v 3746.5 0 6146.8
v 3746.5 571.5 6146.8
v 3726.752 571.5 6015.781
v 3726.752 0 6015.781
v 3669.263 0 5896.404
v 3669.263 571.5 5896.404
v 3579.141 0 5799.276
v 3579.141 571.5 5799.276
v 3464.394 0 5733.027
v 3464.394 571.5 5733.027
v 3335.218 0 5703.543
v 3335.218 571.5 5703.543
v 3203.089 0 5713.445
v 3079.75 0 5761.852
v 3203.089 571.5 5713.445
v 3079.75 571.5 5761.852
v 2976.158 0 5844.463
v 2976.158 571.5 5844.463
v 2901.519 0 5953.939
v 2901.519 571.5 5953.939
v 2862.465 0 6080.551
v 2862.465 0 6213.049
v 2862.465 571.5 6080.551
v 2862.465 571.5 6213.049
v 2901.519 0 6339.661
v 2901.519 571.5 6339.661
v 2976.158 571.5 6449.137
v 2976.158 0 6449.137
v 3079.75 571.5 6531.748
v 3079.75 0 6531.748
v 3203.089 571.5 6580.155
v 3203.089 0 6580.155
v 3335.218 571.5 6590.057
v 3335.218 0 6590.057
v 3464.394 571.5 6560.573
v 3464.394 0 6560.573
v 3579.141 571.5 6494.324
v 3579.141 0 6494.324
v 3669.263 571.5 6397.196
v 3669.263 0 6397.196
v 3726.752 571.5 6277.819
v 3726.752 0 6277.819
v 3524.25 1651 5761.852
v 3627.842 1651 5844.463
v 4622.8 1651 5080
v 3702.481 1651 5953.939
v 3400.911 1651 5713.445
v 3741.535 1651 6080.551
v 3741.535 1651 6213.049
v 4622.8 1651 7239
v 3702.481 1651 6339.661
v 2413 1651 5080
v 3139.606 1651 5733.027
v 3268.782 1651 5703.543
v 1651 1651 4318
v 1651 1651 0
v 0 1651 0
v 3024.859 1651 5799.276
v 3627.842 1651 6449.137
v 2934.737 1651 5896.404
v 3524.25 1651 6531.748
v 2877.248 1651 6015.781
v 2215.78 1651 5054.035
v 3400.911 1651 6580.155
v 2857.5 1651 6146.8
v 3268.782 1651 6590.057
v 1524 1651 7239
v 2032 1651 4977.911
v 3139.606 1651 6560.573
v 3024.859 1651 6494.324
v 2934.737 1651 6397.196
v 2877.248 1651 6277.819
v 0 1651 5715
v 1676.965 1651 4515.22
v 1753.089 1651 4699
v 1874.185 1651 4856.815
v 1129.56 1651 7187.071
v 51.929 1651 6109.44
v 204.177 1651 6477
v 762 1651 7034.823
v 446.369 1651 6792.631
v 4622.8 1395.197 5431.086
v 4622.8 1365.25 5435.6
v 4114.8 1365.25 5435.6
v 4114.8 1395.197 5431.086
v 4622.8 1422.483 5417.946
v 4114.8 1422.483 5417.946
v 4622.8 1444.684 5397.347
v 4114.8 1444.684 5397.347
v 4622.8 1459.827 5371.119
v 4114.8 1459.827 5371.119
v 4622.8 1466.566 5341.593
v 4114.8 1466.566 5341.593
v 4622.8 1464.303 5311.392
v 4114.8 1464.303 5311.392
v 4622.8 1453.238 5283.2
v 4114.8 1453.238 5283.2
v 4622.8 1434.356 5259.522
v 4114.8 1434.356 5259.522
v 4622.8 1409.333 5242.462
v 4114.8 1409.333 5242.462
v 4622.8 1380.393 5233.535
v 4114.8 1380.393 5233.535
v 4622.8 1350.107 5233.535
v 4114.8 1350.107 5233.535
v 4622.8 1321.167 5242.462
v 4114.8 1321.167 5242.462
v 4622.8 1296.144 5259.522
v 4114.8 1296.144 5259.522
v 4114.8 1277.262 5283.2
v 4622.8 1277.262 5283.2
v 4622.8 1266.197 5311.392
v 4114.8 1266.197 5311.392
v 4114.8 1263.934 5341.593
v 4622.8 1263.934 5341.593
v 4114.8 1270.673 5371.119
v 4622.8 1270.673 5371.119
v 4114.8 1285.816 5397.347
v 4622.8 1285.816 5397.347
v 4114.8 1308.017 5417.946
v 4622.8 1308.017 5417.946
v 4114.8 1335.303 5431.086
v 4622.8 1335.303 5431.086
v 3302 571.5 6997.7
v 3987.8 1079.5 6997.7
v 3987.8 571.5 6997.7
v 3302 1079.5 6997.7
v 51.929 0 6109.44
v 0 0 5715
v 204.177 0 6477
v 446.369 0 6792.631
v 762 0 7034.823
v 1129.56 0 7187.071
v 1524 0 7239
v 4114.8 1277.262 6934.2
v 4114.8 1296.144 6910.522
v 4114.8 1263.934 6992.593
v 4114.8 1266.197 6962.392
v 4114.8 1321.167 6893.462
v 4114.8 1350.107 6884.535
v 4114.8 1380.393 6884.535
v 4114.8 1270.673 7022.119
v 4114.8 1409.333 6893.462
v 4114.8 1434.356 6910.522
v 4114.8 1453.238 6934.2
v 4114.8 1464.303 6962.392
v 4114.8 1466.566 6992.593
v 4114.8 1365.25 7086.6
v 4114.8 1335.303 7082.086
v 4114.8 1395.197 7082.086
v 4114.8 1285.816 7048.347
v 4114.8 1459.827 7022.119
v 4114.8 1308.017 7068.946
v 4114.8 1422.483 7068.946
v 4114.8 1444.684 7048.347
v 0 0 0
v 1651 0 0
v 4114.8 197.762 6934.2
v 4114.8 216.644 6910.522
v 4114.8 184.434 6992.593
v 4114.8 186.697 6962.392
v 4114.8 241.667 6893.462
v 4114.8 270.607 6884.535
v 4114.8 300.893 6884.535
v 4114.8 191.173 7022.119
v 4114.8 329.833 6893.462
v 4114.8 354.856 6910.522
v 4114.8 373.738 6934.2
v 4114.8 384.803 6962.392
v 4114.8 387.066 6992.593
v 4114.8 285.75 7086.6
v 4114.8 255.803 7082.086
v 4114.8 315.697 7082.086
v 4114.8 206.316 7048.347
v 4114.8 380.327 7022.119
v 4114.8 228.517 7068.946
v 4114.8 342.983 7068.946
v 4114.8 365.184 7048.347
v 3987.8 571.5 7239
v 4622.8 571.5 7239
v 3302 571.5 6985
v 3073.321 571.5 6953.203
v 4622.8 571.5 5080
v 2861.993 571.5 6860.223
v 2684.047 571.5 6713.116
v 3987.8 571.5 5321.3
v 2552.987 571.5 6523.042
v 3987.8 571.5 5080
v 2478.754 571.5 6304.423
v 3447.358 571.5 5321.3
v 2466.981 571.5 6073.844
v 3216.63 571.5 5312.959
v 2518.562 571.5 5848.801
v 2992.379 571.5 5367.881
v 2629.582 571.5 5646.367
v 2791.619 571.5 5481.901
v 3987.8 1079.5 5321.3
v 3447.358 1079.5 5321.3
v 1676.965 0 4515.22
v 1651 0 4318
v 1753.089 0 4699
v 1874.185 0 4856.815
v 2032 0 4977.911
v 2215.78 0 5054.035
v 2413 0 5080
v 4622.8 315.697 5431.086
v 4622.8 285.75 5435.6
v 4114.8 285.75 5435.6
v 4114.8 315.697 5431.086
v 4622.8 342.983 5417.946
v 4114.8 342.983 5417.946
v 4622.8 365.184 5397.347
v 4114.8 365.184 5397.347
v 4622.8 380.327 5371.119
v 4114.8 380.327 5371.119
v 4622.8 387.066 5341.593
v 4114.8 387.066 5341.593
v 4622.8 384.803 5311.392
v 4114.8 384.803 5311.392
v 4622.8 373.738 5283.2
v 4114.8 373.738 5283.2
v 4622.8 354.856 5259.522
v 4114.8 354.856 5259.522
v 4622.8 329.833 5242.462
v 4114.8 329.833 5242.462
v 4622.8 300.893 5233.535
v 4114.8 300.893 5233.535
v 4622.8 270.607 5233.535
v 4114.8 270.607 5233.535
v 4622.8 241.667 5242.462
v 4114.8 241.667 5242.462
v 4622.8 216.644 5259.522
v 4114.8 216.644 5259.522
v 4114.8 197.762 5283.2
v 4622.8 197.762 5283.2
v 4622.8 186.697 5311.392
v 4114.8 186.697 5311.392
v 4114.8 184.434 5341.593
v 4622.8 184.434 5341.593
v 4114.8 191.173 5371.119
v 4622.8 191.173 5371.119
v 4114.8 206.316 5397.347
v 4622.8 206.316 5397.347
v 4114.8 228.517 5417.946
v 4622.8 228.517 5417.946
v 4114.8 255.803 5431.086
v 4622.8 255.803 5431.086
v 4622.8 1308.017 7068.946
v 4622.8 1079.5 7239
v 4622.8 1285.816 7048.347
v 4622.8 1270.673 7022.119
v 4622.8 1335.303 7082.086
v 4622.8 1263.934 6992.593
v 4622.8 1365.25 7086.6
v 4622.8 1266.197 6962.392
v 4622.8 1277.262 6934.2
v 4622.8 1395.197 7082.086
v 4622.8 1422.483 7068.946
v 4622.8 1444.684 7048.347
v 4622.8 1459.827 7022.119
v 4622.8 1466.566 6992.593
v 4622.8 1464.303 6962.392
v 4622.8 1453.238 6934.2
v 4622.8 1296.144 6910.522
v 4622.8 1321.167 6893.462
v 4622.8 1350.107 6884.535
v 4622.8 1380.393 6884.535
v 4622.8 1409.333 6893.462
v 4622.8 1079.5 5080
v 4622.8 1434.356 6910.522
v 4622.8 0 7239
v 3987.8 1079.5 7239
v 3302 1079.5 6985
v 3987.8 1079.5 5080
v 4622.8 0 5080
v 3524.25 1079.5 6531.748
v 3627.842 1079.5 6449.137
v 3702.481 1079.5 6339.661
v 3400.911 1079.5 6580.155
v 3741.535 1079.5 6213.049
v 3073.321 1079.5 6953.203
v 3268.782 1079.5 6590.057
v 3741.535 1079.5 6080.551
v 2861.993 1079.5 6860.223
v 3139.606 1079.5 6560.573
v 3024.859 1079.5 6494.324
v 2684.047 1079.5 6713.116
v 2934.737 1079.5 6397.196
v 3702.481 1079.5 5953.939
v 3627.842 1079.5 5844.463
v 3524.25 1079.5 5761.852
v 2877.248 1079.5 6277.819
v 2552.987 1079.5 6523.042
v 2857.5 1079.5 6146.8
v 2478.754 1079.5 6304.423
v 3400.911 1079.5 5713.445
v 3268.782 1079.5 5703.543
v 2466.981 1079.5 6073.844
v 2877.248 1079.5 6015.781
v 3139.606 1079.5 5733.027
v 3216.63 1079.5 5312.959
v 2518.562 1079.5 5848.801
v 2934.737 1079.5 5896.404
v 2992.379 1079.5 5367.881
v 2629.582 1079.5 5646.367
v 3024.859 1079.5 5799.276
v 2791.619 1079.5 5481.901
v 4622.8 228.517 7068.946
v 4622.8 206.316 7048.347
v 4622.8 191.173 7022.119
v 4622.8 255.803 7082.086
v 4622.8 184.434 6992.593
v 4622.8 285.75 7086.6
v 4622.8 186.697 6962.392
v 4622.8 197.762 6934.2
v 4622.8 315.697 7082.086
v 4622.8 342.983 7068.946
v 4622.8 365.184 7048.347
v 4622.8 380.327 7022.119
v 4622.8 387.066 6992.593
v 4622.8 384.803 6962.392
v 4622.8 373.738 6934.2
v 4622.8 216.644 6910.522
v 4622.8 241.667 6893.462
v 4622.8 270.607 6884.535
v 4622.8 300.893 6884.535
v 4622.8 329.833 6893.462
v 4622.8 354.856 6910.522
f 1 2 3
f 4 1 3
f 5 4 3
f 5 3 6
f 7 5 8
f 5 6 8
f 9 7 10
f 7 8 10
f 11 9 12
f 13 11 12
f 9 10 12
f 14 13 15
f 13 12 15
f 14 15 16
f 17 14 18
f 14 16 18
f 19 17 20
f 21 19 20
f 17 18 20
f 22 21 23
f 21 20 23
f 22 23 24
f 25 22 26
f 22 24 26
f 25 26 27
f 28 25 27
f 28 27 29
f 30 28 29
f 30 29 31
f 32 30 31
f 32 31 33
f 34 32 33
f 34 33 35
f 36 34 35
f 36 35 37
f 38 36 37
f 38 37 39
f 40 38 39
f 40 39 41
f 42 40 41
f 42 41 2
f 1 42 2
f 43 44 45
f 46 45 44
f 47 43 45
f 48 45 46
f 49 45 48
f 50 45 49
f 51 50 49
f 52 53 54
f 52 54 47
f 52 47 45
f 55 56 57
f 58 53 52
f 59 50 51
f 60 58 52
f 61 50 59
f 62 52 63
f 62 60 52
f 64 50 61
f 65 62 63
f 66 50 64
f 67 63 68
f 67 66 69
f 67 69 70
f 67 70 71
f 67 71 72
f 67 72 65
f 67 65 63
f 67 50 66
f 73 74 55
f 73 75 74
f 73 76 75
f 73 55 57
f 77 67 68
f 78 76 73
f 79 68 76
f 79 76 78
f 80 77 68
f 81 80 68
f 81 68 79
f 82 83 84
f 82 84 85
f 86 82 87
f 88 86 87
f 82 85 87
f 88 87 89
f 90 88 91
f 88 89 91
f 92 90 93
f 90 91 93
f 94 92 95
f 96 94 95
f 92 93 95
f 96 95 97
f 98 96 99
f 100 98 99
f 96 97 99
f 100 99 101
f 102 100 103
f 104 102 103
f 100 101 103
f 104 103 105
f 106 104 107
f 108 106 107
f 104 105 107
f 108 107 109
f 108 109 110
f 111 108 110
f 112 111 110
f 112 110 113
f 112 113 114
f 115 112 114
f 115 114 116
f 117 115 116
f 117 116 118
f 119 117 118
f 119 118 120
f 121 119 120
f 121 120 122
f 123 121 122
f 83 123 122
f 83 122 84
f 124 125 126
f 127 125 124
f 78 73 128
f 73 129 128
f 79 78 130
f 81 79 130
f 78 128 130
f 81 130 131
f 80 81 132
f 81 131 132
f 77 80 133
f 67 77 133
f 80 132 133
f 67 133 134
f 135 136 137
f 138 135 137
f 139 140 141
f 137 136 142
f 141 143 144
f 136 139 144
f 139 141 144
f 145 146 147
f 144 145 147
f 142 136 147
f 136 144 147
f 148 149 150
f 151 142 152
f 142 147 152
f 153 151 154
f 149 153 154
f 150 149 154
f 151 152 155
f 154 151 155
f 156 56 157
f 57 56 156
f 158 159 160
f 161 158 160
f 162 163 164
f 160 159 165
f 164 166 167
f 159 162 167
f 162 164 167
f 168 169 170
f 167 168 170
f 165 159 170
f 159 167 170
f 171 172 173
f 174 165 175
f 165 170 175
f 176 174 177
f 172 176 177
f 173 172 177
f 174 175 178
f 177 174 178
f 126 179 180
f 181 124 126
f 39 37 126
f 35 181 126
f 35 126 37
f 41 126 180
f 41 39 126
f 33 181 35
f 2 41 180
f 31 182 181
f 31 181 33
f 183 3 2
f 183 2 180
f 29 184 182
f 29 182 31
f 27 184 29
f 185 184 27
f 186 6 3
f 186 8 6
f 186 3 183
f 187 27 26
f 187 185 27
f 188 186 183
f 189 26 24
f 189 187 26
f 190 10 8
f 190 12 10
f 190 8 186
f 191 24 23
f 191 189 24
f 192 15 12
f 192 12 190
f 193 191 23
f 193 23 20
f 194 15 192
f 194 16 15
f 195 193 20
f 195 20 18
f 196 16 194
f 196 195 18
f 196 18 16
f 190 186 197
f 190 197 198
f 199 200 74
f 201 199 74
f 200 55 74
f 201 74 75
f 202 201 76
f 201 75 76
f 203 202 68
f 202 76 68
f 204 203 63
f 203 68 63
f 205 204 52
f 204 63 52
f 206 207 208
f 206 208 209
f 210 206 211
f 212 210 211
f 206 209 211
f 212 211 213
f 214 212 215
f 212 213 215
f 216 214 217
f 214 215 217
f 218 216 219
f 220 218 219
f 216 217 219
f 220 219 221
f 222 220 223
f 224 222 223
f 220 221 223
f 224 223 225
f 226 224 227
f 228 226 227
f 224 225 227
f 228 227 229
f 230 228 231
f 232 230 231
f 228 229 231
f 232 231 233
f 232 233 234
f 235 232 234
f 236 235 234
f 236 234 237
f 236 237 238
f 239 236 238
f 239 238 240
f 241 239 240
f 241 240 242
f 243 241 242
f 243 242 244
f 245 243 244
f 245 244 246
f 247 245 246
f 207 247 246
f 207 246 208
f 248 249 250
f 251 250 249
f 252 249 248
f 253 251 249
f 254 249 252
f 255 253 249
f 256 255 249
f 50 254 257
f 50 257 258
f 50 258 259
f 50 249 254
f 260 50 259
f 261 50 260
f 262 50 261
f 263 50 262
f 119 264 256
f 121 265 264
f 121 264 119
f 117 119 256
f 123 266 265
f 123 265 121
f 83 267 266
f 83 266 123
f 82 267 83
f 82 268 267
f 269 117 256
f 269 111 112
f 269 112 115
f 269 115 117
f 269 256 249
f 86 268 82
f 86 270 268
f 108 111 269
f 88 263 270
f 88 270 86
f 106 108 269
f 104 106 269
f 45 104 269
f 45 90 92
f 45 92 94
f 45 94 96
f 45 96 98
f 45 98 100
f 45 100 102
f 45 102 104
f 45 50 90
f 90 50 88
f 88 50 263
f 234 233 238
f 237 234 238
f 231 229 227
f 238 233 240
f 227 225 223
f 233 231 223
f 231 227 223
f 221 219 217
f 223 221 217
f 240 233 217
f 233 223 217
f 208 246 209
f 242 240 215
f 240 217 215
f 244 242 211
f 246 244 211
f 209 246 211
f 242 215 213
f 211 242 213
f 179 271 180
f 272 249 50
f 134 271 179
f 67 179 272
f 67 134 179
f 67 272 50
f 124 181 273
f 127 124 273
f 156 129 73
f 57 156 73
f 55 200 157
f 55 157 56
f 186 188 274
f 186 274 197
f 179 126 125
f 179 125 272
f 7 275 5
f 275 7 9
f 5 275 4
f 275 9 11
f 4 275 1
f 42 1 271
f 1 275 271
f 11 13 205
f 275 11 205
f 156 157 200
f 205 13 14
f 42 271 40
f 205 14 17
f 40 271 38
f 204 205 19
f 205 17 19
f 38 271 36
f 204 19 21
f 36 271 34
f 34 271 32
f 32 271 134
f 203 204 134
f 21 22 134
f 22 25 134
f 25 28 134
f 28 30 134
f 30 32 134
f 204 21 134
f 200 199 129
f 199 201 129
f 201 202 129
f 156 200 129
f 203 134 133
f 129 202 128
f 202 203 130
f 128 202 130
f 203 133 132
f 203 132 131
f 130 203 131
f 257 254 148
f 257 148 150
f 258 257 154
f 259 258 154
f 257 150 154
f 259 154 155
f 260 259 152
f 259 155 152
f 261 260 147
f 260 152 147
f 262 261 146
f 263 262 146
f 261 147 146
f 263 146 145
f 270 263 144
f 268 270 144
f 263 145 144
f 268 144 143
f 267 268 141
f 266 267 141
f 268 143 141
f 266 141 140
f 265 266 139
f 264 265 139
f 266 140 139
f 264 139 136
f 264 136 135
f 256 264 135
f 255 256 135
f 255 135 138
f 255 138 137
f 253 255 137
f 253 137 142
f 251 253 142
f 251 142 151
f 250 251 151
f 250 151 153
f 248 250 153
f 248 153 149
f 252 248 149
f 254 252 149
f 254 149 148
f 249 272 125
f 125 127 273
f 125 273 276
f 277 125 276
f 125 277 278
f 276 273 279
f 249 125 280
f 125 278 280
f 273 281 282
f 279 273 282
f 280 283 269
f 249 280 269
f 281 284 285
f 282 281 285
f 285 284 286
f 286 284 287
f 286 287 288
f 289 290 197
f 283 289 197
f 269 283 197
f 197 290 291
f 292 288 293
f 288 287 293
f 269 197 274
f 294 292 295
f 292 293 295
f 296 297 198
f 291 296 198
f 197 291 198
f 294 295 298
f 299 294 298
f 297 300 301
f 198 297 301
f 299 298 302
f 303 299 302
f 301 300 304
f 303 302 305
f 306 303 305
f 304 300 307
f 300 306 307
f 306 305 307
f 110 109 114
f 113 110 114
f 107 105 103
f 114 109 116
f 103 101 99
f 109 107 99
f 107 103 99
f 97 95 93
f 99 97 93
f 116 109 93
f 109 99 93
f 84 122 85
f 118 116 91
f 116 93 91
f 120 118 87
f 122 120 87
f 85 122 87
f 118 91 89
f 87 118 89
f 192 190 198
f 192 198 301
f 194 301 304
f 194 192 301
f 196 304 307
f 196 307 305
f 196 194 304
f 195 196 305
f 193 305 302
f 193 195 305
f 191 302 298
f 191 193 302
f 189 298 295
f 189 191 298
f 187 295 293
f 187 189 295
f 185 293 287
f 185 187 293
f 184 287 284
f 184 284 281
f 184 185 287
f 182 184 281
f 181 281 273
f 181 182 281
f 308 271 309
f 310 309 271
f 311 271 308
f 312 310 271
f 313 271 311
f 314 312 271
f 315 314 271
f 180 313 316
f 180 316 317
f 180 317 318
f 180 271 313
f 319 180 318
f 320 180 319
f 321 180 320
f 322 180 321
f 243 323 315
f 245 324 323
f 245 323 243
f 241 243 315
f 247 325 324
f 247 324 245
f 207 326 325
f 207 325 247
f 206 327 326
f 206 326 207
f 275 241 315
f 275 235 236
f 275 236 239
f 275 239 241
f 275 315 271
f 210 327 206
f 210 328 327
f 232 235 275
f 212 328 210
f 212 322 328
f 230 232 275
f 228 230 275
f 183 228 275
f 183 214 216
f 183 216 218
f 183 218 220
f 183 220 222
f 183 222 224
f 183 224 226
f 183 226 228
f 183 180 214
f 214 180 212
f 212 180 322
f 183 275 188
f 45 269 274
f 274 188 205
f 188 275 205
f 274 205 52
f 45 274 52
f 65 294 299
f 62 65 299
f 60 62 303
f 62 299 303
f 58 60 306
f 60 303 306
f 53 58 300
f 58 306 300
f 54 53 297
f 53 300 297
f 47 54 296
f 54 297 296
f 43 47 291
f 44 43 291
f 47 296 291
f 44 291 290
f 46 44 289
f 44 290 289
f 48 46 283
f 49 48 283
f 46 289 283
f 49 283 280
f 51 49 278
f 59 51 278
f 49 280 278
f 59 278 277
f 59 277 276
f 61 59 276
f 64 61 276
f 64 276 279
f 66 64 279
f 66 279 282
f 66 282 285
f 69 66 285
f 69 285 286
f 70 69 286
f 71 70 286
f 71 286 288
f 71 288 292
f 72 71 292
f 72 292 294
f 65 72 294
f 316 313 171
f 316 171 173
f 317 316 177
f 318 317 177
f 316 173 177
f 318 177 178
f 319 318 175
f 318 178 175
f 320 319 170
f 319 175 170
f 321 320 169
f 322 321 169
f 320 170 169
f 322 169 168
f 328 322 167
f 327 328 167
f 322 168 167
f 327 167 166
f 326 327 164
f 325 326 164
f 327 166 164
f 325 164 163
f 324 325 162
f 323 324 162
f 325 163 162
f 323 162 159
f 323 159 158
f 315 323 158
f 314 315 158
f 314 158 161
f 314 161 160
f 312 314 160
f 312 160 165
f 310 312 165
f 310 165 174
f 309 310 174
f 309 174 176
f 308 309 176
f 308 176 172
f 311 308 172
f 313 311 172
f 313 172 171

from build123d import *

# Parameters (mm, degrees)
SKETCH1_W           = 3987.8
SKETCH1_H           = 2159
BOSS_EXTRUDE1_DEPTH = 571.5
BOSS_EXTRUDE2_DEPTH = 508
SKETCH3_W           = 3987.8
SKETCH3_H           = 2159
BOSS_EXTRUDE3_DEPTH = 571.5
SKETCH4_W           = 685.8
SKETCH4_H           = 508
CUT_EXTRUDE1_DEPTH  = 12.7
SKETCH5_W           = 2159
SKETCH5_H           = 571.5
BOSS_EXTRUDE4_DEPTH = 635
SKETCH6_W           = 2159
SKETCH6_H           = 571.5
BOSS_EXTRUDE5_DEPTH = 635
SKETCH7_W           = 1651
SKETCH7_H           = 1651
BOSS_EXTRUDE6_DEPTH = 5080
HOLE1_D             = 203.2
HOLE1_DEPTH         = 508
HOLE2_D             = 889
HOLE2_DEPTH         = 571.5
HOLE3_D             = 889
FILLET1_R           = 762
FILLET2_R           = 1524


with BuildPart() as part:
    # Sketch1 → Boss-Extrude1 (new body)
    with BuildSketch(Plane(origin=(0, 571.5, 0), x_dir=(1, 0, 0), z_dir=(0, 1, 0))):
        with Locations((1993.9, -6159.5)):
            Rectangle(SKETCH1_W, SKETCH1_H)
    extrude(amount=-BOSS_EXTRUDE1_DEPTH)

    # Sketch2 → Boss-Extrude2 (add)
    with BuildSketch(Plane(origin=(0, 571.5, 0), x_dir=(-1, 0, 0), z_dir=(0, 1, 0))):
        with BuildLine():
            Line((-3987.8, 5321.3), (-3447.358143907, 5321.3))
            ThreePointArc((-3447.358143907, 5321.3), (-2466.981036143, 6073.844054389), (-3302, 6985))
            Line((-3302, 6985), (-3987.8, 6985))
            Line((-3987.8, 6985), (-3987.8, 7239))
            Line((-3987.8, 7239), (0, 7239))
            Line((0, 7239), (0, 5080))
            Line((0, 5080), (-3987.8, 5080))
            Line((-3987.8, 5080), (-3987.8, 5321.3))
        make_face()
    extrude(amount=BOSS_EXTRUDE2_DEPTH)

    # Sketch3 → Boss-Extrude3 (add)
    with BuildSketch(Plane(origin=(0, 1079.5, 0), x_dir=(-1, 0, 0), z_dir=(0, 1, 0))):
        with Locations((-1993.9, 6159.5)):
            Rectangle(SKETCH3_W, SKETCH3_H)
    extrude(amount=BOSS_EXTRUDE3_DEPTH)

    # Sketch4 → Cut-Extrude1 (cut)
    with BuildSketch(Plane(origin=(0, 0, 6985), x_dir=(-1, 0, 0), z_dir=(0, 0, -1))):
        with Locations((-3644.9, 825.5)):
            Rectangle(SKETCH4_W, SKETCH4_H)
    extrude(amount=-CUT_EXTRUDE1_DEPTH, mode=Mode.SUBTRACT)

    # Sketch5 → Boss-Extrude4 (add)
    with BuildSketch(Plane(origin=(3987.8, 0, 0), x_dir=(0, 0, -1), z_dir=(1, 0, 0))):
        with Locations((-6159.5, 285.75)):
            Rectangle(SKETCH5_W, SKETCH5_H)
    extrude(amount=BOSS_EXTRUDE4_DEPTH)

    # Sketch6 → Boss-Extrude5 (add)
    with BuildSketch(Plane(origin=(3987.8, 0, 0), x_dir=(0, 0, -1), z_dir=(1, 0, 0))):
        with Locations((-6159.5, 1365.25)):
            Rectangle(SKETCH6_W, SKETCH6_H)
    extrude(amount=BOSS_EXTRUDE5_DEPTH)

    # Sketch7 → Boss-Extrude6 (add)
    with BuildSketch(Plane(origin=(0, 0, 5080), x_dir=(-1, 0, 0), z_dir=(0, 0, -1))):
        with Locations((-825.5, 825.5)):
            Rectangle(SKETCH7_W, SKETCH7_H)
    extrude(amount=BOSS_EXTRUDE6_DEPTH)

    # Hole1
    with Locations(Plane(origin=(4622.8, 0, 0), x_dir=(0, 0, -1), z_dir=(1, 0, 0))):
        with Locations((-6985, 285.75), (-5334, 285.75), (-5334, 1365.25), (-6985, 1365.25)):
            Hole(HOLE1_D / 2, depth=HOLE1_DEPTH)

    # Hole2
    with Locations(Plane(origin=(0, 0, 0), x_dir=(-1, 0, 0), z_dir=(0, -1, 0))):
        with Locations((-3302, -6146.8)):
            Hole(HOLE2_D / 2, depth=HOLE2_DEPTH)

    # Hole3 (through all)
    with Locations(Plane(origin=(0, 1651, 0), x_dir=(1, 0, 0), z_dir=(0, 1, 0))):
        with Locations((3302, -6146.8)):
            Hole(HOLE3_D / 2)

    # Fillet1
    fillet1_edges = [part.edges().sort_by_distance(p)[0] for p in [
        (1651, 825.5, 5080),
    ]]
    fillet(fillet1_edges, radius=FILLET1_R)

    # Fillet2
    fillet2_edges = [part.edges().sort_by_distance(p)[0] for p in [
        (0, 825.5, 7239),
    ]]
    fillet(fillet2_edges, radius=FILLET2_R)


solid = part.part
